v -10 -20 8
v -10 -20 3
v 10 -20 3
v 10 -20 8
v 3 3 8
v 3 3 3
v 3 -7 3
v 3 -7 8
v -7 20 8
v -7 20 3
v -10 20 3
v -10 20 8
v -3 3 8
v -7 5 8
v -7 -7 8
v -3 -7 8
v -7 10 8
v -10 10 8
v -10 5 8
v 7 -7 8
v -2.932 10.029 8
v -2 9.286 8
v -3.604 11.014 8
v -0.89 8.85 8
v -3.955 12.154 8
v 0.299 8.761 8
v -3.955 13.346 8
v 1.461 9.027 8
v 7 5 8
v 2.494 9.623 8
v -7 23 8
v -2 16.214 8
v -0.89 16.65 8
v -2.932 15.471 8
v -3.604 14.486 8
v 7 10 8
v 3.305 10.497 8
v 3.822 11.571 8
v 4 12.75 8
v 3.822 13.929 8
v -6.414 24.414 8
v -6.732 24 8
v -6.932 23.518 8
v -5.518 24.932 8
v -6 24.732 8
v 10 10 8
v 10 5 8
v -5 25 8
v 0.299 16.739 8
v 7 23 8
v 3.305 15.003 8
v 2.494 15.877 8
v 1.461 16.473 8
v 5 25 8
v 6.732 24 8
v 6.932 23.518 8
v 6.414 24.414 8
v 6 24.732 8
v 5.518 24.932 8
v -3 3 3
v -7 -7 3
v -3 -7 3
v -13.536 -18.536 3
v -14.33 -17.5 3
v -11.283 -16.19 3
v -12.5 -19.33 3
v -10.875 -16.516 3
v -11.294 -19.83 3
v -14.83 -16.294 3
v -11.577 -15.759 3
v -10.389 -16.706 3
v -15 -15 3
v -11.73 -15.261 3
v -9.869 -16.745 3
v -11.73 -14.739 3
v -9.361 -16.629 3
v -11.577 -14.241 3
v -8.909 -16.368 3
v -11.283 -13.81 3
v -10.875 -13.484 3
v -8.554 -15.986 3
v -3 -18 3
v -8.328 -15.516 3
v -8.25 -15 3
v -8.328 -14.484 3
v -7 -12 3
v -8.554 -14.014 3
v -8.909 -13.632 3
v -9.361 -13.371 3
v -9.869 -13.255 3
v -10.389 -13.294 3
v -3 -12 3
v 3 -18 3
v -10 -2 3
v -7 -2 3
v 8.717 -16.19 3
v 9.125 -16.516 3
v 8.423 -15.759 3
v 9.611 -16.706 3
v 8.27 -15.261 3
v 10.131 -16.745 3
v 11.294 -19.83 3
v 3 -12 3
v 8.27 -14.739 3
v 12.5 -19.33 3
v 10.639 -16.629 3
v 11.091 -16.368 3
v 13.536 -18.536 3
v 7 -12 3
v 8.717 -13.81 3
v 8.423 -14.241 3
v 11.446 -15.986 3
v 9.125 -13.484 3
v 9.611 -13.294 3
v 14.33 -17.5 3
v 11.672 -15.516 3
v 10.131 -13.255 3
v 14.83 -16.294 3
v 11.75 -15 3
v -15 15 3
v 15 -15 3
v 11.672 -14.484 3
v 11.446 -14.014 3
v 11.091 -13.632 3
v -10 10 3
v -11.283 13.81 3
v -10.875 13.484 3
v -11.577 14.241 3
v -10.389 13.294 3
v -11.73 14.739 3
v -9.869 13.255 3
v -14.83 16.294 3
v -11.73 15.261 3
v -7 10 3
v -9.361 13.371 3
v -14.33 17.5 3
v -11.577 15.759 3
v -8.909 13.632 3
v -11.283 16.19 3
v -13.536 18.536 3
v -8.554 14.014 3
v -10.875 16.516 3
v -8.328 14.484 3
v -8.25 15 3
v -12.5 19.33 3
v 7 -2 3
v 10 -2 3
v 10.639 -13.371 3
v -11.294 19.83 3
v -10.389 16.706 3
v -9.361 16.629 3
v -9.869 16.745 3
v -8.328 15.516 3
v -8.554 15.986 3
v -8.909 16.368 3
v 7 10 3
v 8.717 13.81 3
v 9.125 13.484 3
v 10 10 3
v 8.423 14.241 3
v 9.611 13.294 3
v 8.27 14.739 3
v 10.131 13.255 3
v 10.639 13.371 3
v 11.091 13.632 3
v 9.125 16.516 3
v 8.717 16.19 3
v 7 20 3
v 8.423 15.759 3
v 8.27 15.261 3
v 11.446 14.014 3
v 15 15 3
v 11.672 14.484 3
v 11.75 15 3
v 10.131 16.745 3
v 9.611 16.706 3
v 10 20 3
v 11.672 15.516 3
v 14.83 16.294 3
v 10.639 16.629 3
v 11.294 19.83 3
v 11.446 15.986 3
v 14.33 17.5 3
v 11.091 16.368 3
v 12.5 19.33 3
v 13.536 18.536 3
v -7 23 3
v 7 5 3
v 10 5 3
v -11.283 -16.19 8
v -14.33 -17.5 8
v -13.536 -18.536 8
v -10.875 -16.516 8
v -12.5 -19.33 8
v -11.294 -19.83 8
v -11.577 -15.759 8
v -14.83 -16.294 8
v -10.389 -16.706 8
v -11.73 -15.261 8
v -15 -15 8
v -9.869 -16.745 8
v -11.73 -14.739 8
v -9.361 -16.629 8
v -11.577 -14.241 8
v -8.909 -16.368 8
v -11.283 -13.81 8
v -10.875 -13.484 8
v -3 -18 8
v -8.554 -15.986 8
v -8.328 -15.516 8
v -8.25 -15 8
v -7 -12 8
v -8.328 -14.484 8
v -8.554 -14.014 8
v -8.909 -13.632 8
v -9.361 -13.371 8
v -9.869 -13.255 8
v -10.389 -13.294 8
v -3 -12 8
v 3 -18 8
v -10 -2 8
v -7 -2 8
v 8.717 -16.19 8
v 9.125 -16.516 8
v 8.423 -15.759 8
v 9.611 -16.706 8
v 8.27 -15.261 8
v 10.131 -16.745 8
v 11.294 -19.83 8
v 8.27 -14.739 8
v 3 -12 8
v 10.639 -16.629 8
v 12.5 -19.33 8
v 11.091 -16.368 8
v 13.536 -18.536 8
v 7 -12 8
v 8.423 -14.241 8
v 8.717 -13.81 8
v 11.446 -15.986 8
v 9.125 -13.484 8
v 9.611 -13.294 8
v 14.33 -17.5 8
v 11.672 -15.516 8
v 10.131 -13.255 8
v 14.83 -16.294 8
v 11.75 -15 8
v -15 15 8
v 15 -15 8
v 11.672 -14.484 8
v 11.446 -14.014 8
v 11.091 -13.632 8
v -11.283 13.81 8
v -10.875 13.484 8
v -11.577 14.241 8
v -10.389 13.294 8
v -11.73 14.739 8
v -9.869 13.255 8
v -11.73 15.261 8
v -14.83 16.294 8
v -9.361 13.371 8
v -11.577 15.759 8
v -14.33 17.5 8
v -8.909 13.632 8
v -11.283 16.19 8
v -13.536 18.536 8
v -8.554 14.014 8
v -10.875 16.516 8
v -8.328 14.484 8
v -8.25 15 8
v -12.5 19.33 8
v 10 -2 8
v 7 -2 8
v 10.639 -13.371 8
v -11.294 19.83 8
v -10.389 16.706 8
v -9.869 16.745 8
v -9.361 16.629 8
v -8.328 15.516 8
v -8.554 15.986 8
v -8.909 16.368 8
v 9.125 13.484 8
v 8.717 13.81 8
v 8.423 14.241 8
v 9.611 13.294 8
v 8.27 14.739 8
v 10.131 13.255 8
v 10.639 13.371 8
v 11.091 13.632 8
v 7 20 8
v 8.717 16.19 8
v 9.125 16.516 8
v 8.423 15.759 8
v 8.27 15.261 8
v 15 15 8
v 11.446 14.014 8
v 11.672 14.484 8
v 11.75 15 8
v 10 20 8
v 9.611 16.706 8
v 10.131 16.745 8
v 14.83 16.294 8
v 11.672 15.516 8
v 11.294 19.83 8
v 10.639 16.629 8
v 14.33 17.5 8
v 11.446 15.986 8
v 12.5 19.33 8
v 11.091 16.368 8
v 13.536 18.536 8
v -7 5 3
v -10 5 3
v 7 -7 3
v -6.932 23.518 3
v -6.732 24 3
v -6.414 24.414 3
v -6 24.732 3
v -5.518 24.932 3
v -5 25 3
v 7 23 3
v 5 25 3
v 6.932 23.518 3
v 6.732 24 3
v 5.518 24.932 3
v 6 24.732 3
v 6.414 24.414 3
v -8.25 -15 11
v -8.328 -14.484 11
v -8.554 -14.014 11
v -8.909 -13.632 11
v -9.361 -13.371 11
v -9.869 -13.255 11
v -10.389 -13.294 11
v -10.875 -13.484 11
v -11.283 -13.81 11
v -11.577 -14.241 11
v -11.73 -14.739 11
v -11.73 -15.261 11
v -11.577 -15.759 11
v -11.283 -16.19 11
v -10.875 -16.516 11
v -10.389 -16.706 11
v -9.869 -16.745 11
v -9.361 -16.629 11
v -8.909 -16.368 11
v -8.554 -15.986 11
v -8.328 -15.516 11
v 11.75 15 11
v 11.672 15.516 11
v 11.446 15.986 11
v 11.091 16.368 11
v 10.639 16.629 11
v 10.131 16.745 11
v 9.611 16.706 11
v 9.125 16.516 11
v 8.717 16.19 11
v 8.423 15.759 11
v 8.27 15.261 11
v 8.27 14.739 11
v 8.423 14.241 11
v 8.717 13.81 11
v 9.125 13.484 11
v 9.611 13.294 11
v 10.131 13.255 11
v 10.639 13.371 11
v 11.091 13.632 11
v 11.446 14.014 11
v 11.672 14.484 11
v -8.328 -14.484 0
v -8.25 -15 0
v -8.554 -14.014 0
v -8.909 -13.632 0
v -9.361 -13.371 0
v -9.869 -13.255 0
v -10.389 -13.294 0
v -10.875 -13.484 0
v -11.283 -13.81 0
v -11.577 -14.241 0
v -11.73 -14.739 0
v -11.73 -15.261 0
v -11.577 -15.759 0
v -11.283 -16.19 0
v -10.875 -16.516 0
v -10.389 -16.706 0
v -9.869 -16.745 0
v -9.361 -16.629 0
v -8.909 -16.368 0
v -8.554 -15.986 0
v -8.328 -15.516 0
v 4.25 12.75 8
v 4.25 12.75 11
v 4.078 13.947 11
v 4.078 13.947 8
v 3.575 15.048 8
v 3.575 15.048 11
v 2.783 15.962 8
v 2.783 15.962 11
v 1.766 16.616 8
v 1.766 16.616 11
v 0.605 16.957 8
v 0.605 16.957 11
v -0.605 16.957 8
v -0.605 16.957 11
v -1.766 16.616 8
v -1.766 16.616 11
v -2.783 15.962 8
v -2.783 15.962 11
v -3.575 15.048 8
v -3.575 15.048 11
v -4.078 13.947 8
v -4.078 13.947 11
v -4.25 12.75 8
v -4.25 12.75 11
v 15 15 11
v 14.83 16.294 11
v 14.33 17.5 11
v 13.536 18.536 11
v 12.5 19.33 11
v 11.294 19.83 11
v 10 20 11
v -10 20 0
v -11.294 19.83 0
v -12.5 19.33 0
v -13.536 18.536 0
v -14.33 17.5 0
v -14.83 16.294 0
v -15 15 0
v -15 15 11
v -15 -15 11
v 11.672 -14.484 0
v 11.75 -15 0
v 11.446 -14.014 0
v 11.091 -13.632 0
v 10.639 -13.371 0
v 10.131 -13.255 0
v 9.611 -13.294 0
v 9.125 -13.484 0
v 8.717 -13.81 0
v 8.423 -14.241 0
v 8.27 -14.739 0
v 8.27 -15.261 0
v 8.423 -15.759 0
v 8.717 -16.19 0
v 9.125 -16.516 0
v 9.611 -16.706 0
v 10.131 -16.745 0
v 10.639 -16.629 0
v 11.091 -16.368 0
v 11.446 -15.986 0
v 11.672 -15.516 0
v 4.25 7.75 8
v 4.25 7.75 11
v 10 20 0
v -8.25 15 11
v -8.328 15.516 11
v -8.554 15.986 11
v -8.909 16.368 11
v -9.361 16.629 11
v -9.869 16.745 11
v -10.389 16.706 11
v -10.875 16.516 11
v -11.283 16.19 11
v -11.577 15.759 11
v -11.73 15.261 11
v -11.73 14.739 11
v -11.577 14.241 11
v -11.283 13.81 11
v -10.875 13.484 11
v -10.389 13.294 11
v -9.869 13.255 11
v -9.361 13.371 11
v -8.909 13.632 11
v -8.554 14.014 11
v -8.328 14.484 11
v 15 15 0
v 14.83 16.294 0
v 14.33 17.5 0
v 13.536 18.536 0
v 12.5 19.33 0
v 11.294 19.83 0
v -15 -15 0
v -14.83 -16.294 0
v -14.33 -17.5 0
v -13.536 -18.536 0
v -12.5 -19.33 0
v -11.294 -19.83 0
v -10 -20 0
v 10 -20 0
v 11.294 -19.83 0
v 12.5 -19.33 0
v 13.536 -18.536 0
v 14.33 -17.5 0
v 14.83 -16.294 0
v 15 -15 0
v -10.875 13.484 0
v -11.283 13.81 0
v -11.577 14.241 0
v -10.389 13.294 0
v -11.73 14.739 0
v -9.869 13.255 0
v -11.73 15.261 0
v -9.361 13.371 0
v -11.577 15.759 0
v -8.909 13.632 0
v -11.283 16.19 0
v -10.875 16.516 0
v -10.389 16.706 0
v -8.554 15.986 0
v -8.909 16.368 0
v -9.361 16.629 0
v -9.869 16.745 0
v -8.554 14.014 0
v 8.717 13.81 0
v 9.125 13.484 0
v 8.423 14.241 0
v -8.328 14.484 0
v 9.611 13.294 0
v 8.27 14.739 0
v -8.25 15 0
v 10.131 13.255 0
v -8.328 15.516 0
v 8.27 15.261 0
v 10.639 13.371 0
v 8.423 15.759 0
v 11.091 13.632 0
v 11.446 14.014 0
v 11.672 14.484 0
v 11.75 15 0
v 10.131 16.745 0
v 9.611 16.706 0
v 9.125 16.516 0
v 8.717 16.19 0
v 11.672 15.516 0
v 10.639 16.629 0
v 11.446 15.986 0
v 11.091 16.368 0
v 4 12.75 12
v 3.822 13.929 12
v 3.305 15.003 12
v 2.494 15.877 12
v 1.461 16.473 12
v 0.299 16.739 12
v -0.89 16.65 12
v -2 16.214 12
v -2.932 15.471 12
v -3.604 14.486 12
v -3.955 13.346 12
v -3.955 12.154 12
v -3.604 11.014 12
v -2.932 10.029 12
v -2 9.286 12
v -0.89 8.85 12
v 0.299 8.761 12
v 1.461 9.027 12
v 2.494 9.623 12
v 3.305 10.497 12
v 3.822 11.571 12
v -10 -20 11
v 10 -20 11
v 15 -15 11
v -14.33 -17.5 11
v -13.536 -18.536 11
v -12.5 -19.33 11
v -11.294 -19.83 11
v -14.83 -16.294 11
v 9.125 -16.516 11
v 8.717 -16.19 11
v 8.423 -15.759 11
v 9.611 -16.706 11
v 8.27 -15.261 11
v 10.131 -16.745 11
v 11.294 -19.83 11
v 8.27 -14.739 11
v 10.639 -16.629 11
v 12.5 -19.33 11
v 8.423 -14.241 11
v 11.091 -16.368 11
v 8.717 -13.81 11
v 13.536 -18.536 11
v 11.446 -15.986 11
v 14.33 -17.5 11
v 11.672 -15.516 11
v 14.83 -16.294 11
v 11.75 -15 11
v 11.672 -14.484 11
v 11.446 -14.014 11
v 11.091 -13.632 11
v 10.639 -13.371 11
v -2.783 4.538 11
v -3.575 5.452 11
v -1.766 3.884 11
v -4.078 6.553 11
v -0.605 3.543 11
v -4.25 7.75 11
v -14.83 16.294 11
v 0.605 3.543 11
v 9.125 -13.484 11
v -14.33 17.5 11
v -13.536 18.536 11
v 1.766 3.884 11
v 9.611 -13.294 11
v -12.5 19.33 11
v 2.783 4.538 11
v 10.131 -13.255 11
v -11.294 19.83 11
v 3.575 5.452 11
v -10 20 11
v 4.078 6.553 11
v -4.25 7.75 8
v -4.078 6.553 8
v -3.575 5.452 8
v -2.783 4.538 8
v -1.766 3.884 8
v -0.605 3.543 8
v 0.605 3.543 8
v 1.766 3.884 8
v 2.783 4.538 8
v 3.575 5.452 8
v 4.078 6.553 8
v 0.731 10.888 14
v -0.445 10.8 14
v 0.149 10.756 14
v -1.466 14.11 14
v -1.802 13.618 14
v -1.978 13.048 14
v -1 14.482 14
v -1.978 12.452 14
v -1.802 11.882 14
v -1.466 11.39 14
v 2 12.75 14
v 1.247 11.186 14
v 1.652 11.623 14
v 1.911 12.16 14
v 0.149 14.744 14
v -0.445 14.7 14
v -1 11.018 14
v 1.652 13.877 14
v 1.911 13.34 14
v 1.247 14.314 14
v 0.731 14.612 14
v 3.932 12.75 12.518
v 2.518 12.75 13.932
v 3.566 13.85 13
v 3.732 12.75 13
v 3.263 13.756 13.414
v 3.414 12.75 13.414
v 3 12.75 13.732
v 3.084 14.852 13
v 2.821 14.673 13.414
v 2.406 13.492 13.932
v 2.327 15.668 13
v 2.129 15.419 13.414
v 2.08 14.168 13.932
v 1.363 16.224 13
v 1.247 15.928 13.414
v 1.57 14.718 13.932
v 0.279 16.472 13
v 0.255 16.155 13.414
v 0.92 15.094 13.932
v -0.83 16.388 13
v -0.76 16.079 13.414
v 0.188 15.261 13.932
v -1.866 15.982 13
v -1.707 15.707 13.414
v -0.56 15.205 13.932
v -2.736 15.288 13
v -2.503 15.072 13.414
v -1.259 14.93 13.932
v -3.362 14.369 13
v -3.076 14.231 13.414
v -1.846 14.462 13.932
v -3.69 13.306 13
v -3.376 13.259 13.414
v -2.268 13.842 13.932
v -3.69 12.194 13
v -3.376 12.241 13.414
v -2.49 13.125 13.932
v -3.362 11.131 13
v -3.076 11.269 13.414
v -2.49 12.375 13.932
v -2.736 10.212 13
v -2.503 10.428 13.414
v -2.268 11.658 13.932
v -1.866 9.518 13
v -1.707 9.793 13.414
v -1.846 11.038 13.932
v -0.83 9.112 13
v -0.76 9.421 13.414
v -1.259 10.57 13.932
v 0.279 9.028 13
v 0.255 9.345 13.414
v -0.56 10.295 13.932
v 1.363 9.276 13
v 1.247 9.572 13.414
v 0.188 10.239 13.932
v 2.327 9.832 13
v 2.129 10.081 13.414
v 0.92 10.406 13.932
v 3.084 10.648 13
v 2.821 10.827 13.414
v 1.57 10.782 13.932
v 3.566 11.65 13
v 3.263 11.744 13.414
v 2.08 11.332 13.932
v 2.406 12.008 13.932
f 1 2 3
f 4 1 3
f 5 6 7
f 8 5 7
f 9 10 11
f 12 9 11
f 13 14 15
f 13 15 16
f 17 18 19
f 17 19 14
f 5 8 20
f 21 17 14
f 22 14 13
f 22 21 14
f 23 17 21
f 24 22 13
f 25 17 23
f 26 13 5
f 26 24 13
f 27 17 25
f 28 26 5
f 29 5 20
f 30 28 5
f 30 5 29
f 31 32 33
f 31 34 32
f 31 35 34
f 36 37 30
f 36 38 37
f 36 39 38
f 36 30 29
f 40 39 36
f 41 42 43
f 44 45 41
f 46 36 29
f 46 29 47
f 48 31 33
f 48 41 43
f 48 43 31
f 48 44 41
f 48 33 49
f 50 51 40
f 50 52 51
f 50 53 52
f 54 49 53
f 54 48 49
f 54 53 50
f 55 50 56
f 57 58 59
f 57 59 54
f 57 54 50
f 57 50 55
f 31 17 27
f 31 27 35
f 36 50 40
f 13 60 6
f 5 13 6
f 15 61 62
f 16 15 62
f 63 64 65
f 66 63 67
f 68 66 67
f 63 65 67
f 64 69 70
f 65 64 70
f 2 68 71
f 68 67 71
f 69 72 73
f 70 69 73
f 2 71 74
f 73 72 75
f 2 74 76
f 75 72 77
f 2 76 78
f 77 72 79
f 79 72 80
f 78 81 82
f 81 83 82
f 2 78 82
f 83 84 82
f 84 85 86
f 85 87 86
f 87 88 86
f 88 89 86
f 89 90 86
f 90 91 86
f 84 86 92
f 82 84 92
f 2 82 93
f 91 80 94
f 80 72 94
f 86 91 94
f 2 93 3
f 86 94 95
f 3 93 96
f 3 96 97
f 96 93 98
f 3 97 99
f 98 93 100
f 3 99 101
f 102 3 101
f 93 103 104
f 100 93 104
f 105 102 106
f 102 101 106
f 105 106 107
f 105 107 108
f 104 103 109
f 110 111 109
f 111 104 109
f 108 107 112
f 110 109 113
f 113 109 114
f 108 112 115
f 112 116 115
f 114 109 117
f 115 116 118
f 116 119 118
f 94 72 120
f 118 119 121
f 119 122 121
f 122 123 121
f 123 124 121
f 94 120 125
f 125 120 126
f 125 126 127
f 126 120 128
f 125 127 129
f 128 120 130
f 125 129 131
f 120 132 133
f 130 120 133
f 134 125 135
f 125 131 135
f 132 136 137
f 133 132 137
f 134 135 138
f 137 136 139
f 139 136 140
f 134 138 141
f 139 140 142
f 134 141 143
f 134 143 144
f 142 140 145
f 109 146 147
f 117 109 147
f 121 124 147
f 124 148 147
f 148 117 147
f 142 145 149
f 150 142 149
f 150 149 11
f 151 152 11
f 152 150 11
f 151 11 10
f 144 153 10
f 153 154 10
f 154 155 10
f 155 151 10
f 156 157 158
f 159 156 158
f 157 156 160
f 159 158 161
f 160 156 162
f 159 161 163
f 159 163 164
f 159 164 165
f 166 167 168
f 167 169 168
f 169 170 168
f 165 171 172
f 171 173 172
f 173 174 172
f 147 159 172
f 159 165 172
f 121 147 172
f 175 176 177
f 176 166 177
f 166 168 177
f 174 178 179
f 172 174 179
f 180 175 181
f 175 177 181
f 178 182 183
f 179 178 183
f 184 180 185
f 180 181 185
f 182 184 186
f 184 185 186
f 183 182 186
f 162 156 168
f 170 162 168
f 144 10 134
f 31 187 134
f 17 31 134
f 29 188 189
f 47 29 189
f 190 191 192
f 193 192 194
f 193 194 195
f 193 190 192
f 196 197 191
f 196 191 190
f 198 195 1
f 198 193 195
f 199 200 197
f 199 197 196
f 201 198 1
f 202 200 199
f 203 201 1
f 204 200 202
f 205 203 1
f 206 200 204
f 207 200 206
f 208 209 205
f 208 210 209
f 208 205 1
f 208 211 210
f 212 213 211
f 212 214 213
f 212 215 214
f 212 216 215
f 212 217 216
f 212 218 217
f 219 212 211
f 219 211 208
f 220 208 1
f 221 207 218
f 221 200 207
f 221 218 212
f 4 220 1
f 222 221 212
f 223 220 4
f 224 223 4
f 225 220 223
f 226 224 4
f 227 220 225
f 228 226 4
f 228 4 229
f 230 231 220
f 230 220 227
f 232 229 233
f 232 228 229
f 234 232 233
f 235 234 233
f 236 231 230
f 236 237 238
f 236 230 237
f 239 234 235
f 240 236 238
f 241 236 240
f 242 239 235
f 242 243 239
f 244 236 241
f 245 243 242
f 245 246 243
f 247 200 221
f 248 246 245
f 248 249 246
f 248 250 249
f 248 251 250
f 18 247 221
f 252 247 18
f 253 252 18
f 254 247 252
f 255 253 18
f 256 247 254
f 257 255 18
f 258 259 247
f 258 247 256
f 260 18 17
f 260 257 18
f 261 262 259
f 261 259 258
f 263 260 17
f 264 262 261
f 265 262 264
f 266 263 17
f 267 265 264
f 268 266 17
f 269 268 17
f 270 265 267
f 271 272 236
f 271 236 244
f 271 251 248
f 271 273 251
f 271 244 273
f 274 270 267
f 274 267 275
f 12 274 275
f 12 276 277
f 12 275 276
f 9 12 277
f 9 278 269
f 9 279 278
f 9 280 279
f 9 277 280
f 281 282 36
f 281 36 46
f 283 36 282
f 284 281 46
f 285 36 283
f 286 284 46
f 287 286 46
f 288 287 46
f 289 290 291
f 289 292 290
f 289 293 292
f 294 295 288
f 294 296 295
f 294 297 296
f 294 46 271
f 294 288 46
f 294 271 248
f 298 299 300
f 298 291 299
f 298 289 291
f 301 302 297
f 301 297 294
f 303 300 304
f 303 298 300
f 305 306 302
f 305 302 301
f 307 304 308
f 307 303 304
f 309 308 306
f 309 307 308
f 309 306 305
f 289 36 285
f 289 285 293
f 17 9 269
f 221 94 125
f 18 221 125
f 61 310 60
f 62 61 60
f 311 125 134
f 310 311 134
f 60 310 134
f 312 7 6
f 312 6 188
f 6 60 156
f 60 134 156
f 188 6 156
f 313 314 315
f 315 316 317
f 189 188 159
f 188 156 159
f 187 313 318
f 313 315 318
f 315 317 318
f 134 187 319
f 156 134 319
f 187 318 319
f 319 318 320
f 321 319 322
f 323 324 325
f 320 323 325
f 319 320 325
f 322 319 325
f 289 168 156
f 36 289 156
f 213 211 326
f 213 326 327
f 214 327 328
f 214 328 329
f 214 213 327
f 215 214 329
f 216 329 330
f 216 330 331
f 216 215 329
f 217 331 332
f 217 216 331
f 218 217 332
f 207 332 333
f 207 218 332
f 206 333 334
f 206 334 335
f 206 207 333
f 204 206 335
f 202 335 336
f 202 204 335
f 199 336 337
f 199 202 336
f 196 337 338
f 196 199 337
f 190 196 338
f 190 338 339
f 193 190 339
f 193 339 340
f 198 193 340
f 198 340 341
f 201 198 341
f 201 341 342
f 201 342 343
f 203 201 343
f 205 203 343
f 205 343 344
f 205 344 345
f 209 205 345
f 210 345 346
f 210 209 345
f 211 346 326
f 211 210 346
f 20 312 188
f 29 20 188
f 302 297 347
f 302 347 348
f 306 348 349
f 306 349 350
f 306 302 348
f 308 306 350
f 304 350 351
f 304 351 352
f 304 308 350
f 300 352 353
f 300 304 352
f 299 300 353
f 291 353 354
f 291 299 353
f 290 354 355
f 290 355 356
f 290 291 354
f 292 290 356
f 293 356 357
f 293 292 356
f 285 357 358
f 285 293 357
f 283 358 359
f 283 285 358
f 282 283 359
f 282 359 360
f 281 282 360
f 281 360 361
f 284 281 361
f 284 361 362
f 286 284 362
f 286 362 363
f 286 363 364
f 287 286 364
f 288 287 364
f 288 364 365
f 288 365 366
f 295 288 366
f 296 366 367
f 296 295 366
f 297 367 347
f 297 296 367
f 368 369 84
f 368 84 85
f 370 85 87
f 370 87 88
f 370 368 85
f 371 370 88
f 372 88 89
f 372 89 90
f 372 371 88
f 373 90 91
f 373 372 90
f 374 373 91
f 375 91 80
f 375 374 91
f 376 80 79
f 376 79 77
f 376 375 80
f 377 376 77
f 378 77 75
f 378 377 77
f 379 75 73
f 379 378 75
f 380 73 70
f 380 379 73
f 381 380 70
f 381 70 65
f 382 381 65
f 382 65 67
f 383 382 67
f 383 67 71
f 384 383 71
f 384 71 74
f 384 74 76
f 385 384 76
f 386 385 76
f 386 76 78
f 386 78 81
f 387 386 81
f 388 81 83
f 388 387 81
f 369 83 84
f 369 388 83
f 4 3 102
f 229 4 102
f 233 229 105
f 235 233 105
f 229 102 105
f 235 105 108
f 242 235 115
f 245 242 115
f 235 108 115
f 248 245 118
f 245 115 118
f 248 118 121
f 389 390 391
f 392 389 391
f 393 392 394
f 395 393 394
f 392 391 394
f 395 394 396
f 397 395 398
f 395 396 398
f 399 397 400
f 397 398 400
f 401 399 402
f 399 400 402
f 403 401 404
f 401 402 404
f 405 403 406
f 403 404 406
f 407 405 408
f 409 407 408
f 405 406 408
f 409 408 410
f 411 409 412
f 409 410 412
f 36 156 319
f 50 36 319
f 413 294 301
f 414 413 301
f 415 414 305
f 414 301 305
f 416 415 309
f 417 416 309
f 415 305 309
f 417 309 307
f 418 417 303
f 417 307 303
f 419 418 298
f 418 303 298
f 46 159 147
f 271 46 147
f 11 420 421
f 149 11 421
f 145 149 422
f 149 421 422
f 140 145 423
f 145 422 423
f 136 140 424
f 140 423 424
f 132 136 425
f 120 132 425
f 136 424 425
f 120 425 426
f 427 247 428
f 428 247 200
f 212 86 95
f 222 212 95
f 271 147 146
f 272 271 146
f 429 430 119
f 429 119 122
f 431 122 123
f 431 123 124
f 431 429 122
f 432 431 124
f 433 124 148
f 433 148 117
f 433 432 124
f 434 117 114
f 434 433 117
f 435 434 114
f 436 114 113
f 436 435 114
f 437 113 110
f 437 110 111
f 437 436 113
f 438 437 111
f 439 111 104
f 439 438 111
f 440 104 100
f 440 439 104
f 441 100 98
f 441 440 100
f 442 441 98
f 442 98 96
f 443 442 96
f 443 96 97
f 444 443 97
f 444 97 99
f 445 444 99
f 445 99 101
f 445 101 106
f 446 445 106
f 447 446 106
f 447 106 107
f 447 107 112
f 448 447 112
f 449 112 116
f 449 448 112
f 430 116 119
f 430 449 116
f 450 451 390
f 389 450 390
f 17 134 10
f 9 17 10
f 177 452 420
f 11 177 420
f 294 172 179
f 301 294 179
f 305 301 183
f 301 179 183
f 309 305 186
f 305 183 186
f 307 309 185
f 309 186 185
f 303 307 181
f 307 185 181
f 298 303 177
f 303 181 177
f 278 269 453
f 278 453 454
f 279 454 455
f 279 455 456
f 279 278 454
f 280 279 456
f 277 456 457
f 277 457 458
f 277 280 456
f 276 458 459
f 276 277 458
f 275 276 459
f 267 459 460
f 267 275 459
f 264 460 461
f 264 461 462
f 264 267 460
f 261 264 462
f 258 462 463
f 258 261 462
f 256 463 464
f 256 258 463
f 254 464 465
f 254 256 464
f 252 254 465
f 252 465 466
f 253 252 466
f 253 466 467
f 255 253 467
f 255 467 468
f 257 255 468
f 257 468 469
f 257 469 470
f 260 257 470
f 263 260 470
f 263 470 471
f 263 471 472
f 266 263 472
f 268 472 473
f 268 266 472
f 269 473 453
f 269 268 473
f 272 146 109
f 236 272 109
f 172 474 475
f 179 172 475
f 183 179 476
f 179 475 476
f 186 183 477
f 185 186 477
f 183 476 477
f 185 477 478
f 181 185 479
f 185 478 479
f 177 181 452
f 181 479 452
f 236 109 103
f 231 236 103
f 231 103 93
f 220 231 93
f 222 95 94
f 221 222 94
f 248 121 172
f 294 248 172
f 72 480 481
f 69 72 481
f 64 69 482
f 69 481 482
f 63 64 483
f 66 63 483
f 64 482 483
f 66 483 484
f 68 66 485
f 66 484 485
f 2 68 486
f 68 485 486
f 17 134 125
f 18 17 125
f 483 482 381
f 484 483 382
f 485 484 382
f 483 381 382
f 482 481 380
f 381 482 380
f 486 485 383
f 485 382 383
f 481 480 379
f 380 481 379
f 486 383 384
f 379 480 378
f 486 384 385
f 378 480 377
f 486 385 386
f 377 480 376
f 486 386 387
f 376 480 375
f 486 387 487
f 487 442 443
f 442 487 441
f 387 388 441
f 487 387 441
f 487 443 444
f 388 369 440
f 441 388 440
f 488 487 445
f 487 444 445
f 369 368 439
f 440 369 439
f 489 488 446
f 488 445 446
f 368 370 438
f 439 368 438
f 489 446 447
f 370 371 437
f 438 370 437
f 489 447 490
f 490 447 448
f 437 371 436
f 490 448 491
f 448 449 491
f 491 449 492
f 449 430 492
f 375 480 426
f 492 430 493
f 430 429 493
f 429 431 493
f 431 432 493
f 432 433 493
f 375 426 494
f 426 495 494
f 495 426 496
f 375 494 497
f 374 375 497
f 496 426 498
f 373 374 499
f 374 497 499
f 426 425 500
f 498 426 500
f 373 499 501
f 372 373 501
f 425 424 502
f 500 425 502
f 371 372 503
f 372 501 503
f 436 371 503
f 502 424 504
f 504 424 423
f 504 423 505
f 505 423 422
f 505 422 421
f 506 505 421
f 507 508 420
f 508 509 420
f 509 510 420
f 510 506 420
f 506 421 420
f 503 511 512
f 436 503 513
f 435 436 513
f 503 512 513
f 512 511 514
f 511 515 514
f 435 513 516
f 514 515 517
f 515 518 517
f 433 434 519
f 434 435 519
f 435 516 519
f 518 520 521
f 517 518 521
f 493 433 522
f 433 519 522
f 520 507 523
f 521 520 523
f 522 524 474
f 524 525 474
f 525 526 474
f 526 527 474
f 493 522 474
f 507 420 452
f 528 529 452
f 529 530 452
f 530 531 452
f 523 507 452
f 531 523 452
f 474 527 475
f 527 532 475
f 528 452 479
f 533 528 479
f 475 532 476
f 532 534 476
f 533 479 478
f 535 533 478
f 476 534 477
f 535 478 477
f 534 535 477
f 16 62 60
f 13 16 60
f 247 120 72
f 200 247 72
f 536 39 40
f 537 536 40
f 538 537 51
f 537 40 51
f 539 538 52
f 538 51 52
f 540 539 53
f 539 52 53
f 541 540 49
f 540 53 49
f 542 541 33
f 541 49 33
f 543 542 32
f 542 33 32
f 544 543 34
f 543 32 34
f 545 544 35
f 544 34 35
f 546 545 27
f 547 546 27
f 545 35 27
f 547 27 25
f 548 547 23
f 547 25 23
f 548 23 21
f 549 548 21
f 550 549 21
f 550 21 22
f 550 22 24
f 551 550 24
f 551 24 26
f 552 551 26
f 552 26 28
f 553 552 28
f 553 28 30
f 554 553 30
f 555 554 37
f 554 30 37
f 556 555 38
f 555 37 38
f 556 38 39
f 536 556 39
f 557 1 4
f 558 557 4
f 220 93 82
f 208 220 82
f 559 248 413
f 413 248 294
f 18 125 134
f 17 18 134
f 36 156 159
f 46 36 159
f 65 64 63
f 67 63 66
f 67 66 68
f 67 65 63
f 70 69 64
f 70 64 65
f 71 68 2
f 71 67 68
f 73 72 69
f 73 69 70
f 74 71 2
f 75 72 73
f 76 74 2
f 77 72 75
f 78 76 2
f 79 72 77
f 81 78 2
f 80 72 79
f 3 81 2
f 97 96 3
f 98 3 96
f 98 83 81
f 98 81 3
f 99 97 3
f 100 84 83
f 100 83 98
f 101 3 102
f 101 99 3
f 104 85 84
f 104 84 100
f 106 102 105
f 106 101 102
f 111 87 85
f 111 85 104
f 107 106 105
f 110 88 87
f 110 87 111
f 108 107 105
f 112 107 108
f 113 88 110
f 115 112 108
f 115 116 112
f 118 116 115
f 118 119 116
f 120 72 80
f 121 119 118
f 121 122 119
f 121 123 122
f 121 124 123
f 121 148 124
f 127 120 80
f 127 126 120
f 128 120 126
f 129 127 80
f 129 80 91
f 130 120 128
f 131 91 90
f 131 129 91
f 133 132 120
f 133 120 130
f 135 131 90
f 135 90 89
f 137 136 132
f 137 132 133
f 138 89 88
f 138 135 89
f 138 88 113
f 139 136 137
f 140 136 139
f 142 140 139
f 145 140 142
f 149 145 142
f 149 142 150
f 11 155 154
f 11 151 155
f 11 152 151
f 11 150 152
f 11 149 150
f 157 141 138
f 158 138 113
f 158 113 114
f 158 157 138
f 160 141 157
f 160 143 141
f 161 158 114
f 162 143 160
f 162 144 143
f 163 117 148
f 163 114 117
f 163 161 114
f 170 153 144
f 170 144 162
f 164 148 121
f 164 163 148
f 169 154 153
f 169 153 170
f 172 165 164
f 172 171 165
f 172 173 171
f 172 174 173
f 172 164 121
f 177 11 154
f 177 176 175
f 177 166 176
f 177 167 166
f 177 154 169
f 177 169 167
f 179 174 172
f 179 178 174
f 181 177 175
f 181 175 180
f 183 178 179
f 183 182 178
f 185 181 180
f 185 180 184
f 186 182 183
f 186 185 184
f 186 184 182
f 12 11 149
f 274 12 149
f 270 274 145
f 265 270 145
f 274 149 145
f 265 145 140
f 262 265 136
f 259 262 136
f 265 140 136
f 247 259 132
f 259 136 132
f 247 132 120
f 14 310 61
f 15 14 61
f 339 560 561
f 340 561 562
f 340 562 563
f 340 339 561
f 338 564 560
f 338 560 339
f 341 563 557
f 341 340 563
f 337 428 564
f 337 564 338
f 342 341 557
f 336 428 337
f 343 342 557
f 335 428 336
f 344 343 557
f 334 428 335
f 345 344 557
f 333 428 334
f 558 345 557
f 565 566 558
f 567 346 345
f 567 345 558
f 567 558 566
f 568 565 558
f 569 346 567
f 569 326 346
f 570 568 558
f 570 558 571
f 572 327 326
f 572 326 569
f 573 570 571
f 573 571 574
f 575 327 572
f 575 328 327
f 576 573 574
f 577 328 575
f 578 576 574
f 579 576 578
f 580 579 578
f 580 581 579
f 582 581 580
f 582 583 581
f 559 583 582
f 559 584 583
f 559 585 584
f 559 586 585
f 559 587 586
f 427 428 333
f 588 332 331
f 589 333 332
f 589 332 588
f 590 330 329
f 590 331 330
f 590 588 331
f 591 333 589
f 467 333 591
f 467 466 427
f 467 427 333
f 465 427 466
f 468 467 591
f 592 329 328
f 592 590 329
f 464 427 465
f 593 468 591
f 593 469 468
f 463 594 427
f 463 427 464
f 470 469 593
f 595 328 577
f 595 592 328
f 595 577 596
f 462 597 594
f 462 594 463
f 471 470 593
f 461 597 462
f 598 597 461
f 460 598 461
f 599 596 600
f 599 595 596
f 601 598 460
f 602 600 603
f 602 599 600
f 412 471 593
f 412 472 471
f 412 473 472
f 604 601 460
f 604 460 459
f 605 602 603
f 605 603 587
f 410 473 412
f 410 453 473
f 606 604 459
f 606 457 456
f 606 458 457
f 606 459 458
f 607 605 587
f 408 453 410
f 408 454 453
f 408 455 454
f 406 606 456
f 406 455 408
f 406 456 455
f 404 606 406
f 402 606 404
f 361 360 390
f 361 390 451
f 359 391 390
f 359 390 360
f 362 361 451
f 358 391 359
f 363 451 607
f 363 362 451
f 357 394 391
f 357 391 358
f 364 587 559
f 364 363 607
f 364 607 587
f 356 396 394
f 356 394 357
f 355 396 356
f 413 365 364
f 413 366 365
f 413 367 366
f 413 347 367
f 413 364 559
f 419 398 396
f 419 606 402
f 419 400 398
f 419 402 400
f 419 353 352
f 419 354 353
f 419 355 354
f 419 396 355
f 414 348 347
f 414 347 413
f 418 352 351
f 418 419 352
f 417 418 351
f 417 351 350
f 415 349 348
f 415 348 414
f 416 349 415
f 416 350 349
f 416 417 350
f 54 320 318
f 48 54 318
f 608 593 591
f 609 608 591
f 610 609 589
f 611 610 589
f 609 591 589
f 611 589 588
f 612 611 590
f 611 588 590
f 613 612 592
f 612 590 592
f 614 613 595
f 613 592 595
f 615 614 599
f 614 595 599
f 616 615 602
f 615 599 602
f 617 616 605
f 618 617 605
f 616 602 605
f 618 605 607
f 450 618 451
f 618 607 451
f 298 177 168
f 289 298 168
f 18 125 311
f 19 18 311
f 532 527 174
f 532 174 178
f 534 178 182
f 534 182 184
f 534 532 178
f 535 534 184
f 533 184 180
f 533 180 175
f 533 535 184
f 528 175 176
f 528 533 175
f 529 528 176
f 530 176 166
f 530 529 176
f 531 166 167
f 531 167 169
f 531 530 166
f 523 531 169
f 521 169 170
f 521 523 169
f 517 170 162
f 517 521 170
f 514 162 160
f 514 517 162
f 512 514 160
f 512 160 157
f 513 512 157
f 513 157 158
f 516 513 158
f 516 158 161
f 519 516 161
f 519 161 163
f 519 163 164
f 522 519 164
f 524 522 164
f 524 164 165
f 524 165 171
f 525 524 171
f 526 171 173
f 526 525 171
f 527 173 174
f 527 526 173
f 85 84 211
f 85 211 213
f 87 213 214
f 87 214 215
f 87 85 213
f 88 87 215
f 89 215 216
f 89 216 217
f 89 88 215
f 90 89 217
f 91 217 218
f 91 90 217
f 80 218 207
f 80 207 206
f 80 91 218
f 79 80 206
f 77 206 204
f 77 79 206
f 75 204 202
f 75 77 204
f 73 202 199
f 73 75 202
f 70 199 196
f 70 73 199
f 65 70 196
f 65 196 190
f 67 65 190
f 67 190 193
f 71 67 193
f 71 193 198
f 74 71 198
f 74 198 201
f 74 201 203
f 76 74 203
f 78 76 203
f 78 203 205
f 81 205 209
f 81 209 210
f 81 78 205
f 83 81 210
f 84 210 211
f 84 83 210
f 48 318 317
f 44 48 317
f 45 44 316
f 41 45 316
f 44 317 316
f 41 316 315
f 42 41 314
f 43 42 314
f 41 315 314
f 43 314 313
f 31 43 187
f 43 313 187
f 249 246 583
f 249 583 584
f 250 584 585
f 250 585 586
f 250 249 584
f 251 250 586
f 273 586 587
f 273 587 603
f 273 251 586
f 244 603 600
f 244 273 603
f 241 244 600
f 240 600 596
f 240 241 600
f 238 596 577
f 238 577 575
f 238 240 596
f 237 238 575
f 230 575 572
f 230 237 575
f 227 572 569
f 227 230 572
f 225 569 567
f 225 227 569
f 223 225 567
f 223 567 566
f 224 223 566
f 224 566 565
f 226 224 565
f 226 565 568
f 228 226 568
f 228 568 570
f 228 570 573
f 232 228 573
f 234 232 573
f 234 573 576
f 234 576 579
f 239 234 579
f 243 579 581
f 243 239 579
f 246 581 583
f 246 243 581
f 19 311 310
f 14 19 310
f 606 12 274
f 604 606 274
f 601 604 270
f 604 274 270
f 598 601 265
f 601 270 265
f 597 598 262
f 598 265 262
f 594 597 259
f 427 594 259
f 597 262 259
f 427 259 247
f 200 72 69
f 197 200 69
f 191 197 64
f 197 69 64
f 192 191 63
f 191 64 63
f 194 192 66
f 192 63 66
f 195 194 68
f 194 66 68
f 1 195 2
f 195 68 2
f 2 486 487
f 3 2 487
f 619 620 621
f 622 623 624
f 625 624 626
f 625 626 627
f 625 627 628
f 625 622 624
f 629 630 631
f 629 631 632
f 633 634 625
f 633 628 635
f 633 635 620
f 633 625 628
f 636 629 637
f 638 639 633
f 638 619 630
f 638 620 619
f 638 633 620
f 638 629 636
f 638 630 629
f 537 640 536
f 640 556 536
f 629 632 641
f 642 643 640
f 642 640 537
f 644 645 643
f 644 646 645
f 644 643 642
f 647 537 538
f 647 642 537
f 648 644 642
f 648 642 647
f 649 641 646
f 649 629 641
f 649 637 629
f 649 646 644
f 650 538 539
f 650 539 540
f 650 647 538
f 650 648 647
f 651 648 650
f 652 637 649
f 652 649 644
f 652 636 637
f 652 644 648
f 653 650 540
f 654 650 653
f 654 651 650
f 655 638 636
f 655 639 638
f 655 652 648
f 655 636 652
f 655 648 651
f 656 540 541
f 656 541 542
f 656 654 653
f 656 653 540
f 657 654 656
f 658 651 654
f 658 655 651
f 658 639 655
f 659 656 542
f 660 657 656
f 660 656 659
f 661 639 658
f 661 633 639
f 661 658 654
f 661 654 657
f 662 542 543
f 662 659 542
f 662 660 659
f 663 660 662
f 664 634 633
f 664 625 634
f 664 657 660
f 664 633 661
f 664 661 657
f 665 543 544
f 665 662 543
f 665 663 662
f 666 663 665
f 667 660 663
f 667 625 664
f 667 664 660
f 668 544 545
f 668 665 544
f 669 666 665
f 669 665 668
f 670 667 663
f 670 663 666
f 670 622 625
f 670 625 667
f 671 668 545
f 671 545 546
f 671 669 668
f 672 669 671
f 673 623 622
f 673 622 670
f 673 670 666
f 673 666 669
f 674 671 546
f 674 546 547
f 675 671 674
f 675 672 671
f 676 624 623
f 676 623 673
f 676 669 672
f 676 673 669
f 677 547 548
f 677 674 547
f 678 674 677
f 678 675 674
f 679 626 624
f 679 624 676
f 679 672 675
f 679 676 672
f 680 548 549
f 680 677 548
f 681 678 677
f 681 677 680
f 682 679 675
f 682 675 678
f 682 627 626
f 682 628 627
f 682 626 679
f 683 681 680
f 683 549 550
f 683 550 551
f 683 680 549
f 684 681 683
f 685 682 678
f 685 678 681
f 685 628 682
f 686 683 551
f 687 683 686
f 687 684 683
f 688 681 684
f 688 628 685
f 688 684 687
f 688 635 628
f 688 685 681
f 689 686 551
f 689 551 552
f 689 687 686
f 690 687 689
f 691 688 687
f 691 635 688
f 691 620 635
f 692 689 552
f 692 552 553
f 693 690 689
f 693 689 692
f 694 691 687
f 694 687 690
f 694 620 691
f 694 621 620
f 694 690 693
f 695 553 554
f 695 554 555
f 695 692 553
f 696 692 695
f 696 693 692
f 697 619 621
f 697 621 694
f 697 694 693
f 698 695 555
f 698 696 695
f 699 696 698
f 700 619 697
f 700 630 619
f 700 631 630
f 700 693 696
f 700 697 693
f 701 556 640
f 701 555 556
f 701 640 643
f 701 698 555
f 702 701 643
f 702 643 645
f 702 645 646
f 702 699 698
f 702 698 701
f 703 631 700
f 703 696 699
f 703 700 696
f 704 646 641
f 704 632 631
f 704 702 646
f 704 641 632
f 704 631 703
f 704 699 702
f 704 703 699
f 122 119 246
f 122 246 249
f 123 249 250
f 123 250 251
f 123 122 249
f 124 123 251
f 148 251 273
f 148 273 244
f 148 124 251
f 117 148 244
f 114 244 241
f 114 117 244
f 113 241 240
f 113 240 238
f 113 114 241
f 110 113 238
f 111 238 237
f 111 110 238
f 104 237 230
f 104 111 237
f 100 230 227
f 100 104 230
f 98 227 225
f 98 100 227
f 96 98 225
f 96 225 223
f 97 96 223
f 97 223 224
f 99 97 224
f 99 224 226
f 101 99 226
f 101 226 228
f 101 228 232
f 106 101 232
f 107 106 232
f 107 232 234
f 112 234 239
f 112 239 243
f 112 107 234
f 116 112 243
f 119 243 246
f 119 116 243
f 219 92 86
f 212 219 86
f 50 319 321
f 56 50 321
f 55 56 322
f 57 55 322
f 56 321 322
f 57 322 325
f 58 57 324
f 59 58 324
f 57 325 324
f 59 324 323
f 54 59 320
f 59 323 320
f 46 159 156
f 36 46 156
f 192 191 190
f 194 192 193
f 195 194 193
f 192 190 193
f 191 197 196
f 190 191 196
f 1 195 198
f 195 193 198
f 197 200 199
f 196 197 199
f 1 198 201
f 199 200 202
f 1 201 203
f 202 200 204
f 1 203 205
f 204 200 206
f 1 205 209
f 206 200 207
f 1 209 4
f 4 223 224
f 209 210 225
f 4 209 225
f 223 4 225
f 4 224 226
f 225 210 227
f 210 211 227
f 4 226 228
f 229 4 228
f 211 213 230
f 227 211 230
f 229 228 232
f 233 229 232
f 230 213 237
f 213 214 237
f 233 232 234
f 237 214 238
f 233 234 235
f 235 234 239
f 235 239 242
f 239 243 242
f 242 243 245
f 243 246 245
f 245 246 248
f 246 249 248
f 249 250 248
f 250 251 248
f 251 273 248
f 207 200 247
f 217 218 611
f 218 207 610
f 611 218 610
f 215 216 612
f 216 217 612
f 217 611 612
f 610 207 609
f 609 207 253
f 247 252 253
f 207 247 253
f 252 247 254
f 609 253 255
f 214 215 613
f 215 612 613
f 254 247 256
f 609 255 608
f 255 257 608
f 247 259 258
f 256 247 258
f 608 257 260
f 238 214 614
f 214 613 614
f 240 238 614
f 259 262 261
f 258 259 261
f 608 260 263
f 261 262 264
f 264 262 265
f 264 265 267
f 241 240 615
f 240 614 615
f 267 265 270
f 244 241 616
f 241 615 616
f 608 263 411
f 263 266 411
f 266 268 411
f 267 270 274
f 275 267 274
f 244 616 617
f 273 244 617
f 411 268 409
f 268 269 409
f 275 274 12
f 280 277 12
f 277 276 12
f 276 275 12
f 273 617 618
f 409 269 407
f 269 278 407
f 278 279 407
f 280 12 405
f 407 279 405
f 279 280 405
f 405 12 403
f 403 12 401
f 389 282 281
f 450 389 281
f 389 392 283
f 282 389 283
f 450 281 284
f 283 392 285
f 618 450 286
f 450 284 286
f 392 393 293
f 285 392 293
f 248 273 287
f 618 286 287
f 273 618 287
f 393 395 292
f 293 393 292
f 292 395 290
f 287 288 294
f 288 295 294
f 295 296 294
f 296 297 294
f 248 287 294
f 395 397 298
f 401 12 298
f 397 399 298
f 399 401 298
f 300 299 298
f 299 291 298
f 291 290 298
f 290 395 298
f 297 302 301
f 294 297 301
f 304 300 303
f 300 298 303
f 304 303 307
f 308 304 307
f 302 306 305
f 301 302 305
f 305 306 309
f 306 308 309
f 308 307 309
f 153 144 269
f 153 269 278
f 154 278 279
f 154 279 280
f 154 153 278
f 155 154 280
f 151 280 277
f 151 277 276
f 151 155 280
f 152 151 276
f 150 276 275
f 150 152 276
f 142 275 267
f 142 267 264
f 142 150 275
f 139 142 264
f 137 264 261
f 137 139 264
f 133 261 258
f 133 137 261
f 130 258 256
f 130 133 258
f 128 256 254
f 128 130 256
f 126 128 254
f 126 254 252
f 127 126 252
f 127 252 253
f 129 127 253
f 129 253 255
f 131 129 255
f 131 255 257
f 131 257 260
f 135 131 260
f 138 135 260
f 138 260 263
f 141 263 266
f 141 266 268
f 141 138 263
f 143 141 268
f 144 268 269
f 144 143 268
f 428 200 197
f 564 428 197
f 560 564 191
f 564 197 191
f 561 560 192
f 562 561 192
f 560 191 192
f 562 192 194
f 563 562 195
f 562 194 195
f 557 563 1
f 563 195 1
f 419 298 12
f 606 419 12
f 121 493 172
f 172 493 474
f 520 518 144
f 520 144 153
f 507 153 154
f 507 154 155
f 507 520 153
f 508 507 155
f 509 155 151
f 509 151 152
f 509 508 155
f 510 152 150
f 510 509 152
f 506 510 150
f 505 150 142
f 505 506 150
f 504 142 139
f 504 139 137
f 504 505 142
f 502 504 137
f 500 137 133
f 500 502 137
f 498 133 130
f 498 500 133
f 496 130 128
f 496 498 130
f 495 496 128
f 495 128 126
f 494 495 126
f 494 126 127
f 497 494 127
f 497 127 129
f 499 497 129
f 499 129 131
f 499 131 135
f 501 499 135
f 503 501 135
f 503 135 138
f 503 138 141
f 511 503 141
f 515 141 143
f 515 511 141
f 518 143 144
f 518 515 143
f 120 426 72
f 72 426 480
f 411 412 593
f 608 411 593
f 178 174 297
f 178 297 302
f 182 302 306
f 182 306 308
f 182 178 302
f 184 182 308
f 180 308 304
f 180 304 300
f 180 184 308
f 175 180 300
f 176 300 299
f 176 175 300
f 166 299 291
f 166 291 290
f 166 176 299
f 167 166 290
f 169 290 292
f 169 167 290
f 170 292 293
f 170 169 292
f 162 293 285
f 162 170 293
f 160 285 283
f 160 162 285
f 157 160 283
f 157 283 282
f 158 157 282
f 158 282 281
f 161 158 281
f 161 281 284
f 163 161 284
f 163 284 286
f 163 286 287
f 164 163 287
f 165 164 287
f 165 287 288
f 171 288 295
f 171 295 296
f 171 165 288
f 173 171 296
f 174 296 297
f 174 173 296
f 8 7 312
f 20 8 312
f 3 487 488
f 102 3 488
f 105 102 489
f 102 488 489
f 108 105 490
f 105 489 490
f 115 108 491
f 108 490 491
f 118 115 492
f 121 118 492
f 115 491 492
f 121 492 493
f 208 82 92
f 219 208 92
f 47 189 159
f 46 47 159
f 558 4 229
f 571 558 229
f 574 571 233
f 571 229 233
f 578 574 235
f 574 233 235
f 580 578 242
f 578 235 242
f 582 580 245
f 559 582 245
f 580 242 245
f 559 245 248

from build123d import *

# Parameters (mm, degrees)
F0_R      = 1.75
F1_DEPTH  = 3
F2_R      = 1.75
F3_DEPTH  = 5
F5_DEPTH  = 5
F6_R      = 1.75
F7_DEPTH  = 3
F9_DEPTH  = 3
F10_R     = 4
F11_DEPTH = 6
F12_R     = 2


with BuildPart() as f1:
    # F0 (on Top) → F1 (new body)
    with BuildSketch(Plane.XY):
        with BuildLine():
            Line((10, 20), (-10, 20))
            ThreePointArc((-10, 20), (-13.535534, 18.535534), (-15, 15))
            Line((-15, 15), (-15, -15))
            ThreePointArc((-15, -15), (-13.535534, -18.535534), (-10, -20))
            Line((-10, -20), (10, -20))
            ThreePointArc((10, -20), (13.535534, -18.535534), (15, -15))
            Line((15, -15), (15, 15))
            ThreePointArc((15, 15), (13.535534, 18.535534), (10, 20))
        make_face()
        with Locations((-10, -15)):
            Circle(F0_R, mode=Mode.SUBTRACT)
        with Locations((10, -15)):
            Circle(F0_R, mode=Mode.SUBTRACT)
        with Locations((-10, 15)):
            Circle(F0_R, mode=Mode.SUBTRACT)
        with Locations((10, 15)):
            Circle(F0_R, mode=Mode.SUBTRACT)
    extrude(amount=F1_DEPTH)


with BuildPart() as f3:
    # F2 (on face) → F3 (new body)
    with BuildSketch(Plane.XY.offset(3)):
        with BuildLine():
            Line((-7, 20), (-10, 20))
            ThreePointArc((-10, 20), (-13.535534, 18.535534), (-15, 15))
            Line((-15, 15), (-15, -15))
            ThreePointArc((-15, -15), (-13.535534, -18.535534), (-10, -20))
            Line((-10, -20), (-7, -20))
            Line((-7, -20), (7, -20))
            Line((7, -20), (10, -20))
            ThreePointArc((10, -20), (13.535534, -18.535534), (15, -15))
            Line((15, -15), (15, 15))
            ThreePointArc((15, 15), (13.535534, 18.535534), (10, 20))
            Line((10, 20), (7, 20))
            Line((7, 20), (7, 10))
            Line((7, 10), (10, 10))
            Line((10, 10), (10, -2))
            Line((10, -2), (7, -2))
            Line((7, -2), (7, -12))
            Line((7, -12), (3, -12))
            Line((3, -12), (3, -18))
            Line((3, -18), (-3, -18))
            Line((-3, -18), (-3, -12))
            Line((-3, -12), (-7, -12))
            Line((-7, -12), (-7, -2))
            Line((-7, -2), (-10, -2))
            Line((-10, -2), (-10, 10))
            Line((-10, 10), (-7, 10))
            Line((-7, 10), (-7, 20))
        make_face()
        with Locations((-10, -15)):
            Circle(F2_R, mode=Mode.SUBTRACT)
        with Locations((10, -15)):
            Circle(F2_R, mode=Mode.SUBTRACT)
        with Locations((-10, 15)):
            Circle(F2_R, mode=Mode.SUBTRACT)
        with Locations((10, 15)):
            Circle(F2_R, mode=Mode.SUBTRACT)
    extrude(amount=F3_DEPTH)


with BuildPart() as f5:
    # F4 (on face) → F5 (new body)
    with BuildSketch(Plane.XY.offset(3)):
        with BuildLine():
            Line((-7, 23), (-7, 20))
            Line((-7, 20), (7, 20))
            Line((7, 20), (7, 23))
            ThreePointArc((7, 23), (6.414214, 24.414214), (5, 25))
            Line((5, 25), (-5, 25))
            ThreePointArc((-5, 25), (-6.414214, 24.414214), (-7, 23))
        make_face()
        Polygon((-3, -7), (-3, 3), (3, 3), (3, -7), (7, -7), (7, 5), (10, 5), (10, 10), (7, 10), (7, 20), (-7, 20), (-7, 10), (-10, 10), (-10, 5), (-7, 5), (-7, -7), align=None)
    extrude(amount=F5_DEPTH)

    # F10 (on face) → F11 (join)
    with BuildSketch(Plane.XY.offset(8)):
        with Locations((0, 12.75)):
            Circle(F10_R)
    extrude(amount=F11_DEPTH)

    # F12
    f12_edges = [f5.edges().sort_by_distance(p)[0] for p in [
        (-4, 12.75, 14),
    ]]
    fillet(f12_edges, radius=F12_R)


with BuildPart() as f7:
    # F6 (on face) → F7 (new body)
    with BuildSketch(Plane.XY.offset(8)):
        with BuildLine():
            ThreePointArc((15, 15), (13.535534, 18.535534), (10, 20))
            Line((10, 20), (7, 20))
            Line((7, 20), (-7, 20))
            Line((-7, 20), (-10, 20))
            ThreePointArc((-10, 20), (-13.535534, 18.535534), (-15, 15))
            Line((-15, 15), (-15, -15))
            ThreePointArc((-15, -15), (-13.535534, -18.535534), (-10, -20))
            Line((-10, -20), (10, -20))
            ThreePointArc((10, -20), (13.535534, -18.535534), (15, -15))
            Line((15, -15), (15, 15))
        make_face()
        with Locations((-10, -15)):
            Circle(F6_R, mode=Mode.SUBTRACT)
        with Locations((10, -15)):
            Circle(F6_R, mode=Mode.SUBTRACT)
        with Locations((-10, 15)):
            Circle(F6_R, mode=Mode.SUBTRACT)
        with Locations((10, 15)):
            Circle(F6_R, mode=Mode.SUBTRACT)
    extrude(amount=F7_DEPTH)

    # F8 (on face) → F9 (cut)
    with BuildSketch(Plane.XY.offset(11)):
        with BuildLine():
            Line((4.25, 7.75), (4.25, 12.75))
            ThreePointArc((4.25, 12.75), (0, 17), (-4.25, 12.75))
            Line((-4.25, 12.75), (-4.25, 7.75))
            ThreePointArc((-4.25, 7.75), (0, 3.5), (4.25, 7.75))
        make_face()
    extrude(amount=-F9_DEPTH, mode=Mode.SUBTRACT)


solid = Compound([f1.part, f3.part, f5.part, f7.part])
